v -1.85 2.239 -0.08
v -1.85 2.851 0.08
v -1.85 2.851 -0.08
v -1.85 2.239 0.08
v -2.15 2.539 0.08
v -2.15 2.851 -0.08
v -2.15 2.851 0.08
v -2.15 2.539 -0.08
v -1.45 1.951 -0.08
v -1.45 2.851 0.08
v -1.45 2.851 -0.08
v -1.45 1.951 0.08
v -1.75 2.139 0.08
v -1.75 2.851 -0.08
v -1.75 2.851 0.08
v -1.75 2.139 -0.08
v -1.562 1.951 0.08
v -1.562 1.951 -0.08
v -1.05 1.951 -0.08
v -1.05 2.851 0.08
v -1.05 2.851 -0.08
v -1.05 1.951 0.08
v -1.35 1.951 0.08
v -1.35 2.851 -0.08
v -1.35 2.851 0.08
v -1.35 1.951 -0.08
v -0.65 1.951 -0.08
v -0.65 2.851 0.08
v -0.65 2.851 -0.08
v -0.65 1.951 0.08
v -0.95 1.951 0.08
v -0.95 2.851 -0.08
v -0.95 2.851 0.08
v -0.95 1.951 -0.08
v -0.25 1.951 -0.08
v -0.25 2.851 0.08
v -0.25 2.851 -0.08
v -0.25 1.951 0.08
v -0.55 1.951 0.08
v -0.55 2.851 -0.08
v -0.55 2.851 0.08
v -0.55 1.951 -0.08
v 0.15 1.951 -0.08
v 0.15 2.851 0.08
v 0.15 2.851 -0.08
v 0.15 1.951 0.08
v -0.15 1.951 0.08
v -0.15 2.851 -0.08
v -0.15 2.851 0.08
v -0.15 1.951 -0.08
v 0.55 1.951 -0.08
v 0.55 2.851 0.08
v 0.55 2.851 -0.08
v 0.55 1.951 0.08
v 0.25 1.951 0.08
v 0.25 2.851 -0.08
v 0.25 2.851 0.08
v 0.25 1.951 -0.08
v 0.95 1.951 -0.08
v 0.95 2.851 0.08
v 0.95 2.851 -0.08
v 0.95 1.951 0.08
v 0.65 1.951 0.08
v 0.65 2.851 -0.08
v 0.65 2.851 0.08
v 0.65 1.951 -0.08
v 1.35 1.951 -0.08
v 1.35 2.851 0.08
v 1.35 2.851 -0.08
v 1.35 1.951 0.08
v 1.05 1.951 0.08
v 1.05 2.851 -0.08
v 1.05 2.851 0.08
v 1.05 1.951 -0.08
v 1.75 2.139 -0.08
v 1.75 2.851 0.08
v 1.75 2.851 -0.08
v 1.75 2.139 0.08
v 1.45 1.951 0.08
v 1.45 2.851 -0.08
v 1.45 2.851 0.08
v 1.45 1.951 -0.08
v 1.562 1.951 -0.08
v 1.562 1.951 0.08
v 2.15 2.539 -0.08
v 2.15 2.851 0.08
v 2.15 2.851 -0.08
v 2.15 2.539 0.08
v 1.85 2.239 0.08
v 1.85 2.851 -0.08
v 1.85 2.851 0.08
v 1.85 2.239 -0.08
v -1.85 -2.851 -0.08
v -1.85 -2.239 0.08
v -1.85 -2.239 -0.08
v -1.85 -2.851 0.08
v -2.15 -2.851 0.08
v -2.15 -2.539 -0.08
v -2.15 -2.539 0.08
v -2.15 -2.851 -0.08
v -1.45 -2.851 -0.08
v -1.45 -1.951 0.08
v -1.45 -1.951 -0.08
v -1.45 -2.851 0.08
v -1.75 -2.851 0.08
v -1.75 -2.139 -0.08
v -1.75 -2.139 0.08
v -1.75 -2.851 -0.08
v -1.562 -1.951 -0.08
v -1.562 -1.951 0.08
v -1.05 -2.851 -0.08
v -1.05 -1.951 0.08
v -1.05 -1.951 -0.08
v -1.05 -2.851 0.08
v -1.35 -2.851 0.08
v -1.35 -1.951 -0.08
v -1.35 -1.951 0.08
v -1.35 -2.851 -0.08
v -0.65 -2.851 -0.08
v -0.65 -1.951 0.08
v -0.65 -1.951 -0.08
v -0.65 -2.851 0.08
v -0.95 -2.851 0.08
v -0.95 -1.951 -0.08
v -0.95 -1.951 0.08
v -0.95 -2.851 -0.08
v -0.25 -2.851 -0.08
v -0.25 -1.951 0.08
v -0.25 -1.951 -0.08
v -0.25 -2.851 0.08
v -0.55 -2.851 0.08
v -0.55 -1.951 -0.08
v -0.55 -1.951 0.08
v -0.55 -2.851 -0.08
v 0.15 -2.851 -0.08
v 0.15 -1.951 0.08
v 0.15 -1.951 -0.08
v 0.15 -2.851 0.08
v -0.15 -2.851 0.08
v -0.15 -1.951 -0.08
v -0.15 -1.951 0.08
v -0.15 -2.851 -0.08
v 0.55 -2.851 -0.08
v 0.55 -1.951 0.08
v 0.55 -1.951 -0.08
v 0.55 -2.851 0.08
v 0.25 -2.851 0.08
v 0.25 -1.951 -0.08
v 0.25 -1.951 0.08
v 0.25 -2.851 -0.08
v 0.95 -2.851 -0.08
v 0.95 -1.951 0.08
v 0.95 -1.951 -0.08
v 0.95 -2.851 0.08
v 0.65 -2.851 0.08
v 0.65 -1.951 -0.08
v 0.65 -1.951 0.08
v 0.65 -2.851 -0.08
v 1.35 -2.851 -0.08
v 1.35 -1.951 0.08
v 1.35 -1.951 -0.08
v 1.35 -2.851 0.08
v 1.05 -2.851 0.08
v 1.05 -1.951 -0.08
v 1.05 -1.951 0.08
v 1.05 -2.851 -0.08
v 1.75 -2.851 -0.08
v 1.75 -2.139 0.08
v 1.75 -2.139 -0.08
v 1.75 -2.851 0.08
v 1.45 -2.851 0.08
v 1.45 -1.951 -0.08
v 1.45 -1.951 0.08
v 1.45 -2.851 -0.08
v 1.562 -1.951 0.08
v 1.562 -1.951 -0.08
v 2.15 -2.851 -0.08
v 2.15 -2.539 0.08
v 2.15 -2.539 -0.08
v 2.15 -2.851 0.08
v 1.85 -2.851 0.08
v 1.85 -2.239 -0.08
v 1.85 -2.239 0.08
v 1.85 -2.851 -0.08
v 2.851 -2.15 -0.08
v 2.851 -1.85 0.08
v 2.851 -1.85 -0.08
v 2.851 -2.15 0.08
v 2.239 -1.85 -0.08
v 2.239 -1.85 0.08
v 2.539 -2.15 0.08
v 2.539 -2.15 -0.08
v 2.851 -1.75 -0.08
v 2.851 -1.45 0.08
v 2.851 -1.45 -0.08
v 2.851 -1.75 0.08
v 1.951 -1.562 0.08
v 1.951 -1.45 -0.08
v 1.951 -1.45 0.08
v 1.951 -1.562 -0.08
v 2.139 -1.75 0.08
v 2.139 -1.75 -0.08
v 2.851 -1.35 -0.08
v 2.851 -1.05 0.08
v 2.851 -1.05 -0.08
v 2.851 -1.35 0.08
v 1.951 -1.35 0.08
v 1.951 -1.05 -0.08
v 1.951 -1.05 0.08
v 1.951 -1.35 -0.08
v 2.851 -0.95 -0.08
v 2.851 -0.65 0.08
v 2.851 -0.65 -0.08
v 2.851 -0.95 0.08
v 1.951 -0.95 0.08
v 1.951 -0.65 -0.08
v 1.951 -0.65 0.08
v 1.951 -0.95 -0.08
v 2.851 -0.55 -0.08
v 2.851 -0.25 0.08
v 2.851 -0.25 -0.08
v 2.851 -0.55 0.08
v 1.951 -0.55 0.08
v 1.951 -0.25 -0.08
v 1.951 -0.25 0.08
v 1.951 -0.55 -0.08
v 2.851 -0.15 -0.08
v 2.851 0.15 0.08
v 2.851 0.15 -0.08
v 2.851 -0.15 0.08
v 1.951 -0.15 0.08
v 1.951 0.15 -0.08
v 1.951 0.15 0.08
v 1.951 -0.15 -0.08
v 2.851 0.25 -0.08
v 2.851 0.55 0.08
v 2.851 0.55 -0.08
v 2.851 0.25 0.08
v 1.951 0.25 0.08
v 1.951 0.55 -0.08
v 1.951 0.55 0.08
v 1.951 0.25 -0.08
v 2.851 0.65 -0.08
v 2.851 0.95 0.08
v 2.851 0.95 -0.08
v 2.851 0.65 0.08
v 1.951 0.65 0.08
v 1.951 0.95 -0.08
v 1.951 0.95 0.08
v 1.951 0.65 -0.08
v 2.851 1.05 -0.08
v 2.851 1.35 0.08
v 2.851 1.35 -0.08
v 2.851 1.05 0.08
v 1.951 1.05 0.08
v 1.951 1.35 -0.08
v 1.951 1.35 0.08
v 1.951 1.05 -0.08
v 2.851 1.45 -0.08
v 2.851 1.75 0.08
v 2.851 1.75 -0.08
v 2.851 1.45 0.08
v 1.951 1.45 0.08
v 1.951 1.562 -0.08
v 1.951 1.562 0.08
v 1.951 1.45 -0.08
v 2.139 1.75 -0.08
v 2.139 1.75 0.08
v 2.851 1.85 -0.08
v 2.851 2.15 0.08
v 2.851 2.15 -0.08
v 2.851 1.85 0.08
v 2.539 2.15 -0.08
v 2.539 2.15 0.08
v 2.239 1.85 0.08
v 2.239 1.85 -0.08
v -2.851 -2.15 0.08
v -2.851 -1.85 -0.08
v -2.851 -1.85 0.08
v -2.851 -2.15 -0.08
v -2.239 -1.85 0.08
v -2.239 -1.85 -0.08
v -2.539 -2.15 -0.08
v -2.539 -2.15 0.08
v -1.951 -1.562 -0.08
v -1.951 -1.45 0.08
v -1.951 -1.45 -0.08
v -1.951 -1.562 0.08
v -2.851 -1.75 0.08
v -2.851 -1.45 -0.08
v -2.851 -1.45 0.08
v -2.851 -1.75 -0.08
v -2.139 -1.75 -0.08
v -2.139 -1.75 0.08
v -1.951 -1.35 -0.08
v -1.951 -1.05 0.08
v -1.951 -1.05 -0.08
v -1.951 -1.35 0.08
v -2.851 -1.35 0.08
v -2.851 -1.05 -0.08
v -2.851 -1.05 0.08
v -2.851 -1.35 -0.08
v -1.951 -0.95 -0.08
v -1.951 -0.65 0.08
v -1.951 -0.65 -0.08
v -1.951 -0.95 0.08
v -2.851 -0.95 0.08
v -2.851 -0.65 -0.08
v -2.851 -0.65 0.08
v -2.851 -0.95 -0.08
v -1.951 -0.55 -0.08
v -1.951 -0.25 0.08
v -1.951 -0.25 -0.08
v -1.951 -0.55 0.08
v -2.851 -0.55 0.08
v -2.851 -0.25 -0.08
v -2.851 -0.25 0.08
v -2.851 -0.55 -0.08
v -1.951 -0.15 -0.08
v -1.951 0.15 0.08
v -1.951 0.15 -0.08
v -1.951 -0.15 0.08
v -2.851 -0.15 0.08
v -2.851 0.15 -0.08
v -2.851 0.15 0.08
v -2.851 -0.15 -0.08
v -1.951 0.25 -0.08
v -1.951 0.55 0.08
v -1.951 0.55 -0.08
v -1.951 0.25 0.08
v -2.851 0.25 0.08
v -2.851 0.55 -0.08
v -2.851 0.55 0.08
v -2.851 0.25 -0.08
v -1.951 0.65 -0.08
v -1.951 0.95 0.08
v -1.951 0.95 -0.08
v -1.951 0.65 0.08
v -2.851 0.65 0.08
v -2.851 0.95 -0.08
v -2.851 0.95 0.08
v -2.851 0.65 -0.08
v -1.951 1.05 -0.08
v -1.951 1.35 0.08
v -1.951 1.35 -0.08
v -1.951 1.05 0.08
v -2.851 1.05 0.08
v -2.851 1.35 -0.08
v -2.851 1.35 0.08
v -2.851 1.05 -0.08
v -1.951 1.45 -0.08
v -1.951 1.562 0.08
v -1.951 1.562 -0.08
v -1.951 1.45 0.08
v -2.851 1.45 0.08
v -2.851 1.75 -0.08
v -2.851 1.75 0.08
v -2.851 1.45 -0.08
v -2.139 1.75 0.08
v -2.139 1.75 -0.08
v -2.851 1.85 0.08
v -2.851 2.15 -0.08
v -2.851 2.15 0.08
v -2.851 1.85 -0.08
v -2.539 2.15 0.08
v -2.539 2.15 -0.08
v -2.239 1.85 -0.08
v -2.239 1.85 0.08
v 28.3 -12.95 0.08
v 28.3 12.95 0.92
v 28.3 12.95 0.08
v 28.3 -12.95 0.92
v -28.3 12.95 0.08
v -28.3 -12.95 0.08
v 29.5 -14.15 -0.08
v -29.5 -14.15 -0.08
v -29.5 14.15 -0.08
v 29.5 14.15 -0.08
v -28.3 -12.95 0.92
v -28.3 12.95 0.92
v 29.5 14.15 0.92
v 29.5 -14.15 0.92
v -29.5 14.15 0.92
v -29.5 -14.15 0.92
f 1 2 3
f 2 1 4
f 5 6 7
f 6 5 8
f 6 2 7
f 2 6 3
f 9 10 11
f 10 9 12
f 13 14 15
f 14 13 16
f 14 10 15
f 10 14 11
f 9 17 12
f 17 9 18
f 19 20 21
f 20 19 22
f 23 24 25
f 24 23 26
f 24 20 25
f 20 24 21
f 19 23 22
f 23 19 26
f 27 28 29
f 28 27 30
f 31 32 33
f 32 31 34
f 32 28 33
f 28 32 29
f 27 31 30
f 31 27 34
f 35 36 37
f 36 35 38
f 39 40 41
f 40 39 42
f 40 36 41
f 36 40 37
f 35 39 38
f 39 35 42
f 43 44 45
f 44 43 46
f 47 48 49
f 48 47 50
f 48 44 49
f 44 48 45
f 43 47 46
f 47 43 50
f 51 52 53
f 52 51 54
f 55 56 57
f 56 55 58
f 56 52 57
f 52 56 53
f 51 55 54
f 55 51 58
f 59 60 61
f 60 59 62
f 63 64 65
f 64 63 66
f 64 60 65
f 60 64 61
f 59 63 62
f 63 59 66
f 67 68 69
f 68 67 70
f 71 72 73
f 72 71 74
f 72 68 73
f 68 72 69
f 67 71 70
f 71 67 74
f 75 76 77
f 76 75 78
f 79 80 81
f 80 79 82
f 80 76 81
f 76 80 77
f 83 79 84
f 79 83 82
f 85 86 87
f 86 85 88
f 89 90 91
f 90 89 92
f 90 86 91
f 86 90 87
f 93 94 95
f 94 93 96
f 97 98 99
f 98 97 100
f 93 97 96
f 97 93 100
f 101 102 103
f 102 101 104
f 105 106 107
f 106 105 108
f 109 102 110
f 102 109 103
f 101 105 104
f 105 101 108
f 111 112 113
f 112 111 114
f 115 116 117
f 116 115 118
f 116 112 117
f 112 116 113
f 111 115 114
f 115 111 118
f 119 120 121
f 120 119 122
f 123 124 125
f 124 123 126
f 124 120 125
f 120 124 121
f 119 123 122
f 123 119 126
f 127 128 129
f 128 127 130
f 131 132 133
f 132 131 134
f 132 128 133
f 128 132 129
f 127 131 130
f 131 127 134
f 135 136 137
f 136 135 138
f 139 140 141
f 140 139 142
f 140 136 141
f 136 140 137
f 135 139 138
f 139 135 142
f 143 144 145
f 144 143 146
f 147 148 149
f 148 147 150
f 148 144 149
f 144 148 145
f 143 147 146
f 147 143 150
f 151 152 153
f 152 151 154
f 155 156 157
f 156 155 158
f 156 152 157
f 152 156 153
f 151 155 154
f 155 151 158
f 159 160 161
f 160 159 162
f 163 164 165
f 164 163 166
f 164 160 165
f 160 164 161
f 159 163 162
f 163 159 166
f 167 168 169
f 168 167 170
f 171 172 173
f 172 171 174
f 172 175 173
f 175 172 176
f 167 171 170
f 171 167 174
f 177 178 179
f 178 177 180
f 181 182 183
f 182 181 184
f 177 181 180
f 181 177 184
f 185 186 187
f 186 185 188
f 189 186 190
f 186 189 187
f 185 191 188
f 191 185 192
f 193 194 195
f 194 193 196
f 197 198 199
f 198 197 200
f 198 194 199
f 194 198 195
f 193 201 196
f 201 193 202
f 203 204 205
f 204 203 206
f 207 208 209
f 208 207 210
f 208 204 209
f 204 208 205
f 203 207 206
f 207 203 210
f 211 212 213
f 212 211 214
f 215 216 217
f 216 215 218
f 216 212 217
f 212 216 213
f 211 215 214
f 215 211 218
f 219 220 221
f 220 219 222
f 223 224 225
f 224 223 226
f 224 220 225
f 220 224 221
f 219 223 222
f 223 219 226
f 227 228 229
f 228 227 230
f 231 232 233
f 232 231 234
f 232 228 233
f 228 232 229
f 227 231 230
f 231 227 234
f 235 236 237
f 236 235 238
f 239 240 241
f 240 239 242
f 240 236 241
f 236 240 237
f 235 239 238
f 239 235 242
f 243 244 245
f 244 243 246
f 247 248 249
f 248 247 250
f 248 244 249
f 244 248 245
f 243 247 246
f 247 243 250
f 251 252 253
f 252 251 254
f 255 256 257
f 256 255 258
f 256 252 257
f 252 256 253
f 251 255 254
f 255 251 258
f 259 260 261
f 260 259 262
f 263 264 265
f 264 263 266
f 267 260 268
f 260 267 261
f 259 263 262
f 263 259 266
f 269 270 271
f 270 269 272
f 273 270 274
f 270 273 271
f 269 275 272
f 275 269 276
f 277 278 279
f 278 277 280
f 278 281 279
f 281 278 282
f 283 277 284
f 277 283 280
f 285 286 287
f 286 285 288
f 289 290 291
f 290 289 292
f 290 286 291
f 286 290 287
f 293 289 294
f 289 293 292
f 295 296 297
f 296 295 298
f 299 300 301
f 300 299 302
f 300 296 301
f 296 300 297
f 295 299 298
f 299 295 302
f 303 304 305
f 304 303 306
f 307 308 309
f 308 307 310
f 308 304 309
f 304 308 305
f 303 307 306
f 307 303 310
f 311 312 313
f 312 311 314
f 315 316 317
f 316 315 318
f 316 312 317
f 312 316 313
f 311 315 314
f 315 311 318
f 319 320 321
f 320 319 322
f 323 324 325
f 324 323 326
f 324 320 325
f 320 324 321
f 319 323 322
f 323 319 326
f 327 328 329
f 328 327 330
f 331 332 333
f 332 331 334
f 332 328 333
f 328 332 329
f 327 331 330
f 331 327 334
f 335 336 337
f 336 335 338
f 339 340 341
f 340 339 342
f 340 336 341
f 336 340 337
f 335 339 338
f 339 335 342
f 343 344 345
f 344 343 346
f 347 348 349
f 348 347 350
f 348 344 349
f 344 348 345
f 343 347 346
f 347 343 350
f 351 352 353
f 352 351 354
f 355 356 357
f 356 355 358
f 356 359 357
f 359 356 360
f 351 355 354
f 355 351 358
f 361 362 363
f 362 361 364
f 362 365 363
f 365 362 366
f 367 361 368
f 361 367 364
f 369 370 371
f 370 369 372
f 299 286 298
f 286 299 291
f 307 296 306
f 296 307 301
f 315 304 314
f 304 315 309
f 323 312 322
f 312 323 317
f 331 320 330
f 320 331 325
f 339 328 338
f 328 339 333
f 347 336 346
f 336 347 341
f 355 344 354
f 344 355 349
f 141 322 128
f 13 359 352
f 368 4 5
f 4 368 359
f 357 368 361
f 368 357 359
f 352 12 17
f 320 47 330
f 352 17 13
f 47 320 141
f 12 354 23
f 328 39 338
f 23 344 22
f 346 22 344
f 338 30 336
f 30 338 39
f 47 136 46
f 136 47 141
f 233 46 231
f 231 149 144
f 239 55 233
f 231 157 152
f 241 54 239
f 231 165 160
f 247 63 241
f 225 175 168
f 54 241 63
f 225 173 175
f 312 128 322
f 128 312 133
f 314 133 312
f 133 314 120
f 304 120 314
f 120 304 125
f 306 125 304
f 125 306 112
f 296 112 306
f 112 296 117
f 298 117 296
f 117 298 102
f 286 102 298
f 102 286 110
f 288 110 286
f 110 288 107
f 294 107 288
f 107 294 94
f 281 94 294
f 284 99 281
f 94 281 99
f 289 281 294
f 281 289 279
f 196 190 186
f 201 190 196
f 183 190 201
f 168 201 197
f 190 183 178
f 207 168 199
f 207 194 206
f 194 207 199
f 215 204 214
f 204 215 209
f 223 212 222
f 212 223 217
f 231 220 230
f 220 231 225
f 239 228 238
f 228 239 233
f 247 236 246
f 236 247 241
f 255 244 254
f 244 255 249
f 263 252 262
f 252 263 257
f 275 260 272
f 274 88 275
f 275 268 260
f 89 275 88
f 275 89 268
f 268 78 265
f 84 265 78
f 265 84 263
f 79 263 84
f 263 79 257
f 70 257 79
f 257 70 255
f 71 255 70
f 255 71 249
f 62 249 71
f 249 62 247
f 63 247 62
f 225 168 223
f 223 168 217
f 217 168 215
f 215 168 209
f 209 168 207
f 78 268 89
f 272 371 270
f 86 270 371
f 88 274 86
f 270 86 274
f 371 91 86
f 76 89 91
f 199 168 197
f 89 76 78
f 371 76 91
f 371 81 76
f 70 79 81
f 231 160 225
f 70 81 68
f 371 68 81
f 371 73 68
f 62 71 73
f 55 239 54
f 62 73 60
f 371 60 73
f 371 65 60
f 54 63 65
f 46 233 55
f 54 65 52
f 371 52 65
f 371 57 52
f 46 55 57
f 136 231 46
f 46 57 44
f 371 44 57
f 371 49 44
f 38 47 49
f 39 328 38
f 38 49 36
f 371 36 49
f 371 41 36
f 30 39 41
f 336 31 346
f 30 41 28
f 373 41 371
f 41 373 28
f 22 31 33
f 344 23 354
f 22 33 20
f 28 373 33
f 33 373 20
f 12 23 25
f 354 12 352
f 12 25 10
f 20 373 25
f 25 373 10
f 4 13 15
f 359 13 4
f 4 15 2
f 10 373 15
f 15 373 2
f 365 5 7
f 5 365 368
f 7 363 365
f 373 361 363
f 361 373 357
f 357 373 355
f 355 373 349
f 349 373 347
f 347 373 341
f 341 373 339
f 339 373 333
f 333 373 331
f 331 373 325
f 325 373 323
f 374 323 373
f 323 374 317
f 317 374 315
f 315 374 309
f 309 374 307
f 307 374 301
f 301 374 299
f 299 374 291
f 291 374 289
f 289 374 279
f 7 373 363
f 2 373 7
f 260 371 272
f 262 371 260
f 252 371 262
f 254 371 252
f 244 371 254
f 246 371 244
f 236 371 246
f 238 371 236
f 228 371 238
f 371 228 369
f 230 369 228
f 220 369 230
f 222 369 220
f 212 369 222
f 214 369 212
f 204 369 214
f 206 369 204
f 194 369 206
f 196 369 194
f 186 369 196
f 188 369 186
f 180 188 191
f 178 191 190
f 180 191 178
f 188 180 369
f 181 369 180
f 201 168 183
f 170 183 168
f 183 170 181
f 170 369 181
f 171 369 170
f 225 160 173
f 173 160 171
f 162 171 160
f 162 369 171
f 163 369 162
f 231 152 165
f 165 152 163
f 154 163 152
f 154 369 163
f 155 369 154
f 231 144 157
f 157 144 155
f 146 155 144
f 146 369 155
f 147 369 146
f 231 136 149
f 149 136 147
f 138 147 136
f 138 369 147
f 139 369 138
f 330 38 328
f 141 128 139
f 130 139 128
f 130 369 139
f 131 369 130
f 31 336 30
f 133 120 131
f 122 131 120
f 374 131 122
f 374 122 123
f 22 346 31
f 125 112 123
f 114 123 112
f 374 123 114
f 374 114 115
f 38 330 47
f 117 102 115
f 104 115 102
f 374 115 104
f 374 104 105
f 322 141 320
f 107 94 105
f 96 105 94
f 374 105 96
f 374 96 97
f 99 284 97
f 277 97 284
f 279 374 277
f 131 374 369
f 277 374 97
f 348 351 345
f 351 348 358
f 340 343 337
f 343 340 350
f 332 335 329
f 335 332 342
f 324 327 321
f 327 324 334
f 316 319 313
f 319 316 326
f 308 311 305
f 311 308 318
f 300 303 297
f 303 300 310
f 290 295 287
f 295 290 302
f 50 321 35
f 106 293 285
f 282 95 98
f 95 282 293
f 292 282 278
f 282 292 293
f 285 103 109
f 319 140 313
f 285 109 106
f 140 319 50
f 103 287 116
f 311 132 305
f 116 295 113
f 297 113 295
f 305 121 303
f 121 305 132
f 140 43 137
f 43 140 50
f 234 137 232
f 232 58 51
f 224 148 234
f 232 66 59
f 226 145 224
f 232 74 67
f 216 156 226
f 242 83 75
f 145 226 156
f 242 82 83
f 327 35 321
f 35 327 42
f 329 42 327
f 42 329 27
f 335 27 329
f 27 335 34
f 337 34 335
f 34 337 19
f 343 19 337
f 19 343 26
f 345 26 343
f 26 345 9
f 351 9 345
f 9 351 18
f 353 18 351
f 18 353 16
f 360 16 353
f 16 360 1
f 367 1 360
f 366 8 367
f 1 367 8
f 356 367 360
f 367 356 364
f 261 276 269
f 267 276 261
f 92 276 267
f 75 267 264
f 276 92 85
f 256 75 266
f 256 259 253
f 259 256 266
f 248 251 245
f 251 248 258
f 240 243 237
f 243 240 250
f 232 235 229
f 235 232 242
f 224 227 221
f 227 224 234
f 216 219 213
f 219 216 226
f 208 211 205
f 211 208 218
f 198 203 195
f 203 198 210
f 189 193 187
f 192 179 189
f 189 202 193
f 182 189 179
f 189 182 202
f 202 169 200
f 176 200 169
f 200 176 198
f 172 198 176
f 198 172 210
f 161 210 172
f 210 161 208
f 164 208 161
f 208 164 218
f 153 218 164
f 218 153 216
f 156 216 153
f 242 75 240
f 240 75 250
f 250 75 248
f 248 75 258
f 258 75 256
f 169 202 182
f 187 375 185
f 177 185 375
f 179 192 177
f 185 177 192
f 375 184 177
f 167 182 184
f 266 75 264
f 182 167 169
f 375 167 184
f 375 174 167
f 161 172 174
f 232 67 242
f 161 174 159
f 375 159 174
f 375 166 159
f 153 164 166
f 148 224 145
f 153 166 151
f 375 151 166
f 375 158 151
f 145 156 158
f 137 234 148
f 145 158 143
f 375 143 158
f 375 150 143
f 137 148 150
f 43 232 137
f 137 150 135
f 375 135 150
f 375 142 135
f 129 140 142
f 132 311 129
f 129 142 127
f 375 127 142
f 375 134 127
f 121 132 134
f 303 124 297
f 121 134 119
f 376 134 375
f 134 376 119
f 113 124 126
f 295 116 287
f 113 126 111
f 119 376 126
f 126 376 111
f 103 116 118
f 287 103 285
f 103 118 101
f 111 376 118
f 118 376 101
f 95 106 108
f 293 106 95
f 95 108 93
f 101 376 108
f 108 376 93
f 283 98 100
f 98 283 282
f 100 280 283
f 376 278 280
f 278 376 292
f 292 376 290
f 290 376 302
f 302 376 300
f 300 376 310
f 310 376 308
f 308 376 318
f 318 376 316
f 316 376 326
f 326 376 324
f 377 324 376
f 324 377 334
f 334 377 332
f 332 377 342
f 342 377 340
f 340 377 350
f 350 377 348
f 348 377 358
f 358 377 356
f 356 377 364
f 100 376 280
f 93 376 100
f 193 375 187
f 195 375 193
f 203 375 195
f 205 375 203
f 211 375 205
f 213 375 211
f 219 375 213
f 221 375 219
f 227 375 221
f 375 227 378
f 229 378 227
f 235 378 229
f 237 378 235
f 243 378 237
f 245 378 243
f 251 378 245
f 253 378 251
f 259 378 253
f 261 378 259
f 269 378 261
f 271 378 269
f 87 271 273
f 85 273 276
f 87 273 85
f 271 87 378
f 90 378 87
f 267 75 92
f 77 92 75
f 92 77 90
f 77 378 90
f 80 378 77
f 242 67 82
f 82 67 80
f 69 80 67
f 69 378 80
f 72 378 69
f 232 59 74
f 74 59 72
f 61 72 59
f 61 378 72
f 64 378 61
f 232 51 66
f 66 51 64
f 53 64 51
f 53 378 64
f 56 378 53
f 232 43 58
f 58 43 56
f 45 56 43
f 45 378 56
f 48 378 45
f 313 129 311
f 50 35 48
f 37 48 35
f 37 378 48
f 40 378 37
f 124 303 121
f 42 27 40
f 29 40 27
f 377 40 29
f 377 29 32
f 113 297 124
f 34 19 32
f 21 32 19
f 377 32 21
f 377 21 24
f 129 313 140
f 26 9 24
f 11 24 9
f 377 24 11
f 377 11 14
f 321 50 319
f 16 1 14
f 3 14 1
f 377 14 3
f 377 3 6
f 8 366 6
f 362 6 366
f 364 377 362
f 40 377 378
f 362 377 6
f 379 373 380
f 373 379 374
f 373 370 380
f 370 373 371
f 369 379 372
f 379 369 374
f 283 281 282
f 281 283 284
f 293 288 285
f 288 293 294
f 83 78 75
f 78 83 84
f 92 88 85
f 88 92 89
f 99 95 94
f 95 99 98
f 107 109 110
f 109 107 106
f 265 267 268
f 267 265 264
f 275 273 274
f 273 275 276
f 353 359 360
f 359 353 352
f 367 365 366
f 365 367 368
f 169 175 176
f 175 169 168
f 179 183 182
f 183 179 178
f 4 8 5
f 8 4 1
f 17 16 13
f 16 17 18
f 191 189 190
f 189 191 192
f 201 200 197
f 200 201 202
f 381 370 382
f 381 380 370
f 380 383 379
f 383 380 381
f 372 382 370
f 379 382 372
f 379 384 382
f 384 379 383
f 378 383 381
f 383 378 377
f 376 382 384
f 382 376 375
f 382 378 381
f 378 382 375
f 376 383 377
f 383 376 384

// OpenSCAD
$fa = 0.1;
$fs = 0.1;
length = 56.6;
height = 25.9;
thickness = .16;
padwidth = .30;
padlength = .9;
lipheight = 1;
lipwidth = 1.2;
difference() {
cube([length,height,thickness],center=true);
translate([0,0,0]) {
rotate([0,0,0]) {
    //difference() {
        //cube([5.8, 5.8,thickness+.01],center=true);
        union() {
            for (i = [-2:.4:2]) {
                translate([i,2.401,0]) {
                    cube([padwidth,padlength,thickness+.02],center=true);
                }
            }
            for (i = [-2:.4:2]) {
                translate([i,-2.401,0]) {
                    cube([padwidth,padlength,thickness+.02],center=true);
                }
            }
            for (i = [-2:.4:2]) {
                translate([2.401,i,0]) {
                    cube([padlength,padwidth,thickness+.02],center=true);
                }
            }
            for (i = [-2:.4:2]) {
                translate([-2.401,i,0]) {
                    cube([padlength,padwidth,thickness+.02],center=true);
                }
            }
        }
        //}
        
    
}
}
}
rotate([0,0,45]) {
cube([8, .55, thickness], center=true);
}
rotate([0,0,45]) {
cube([.55, 8, thickness], center=true);
}
translate([-length/2,height/2,-thickness/2]) {
    cube([length, lipwidth, lipheight]);
}
translate([-length/2,-height/2 - lipwidth,-thickness/2]) {
    cube([length, lipwidth, lipheight]);
}
translate([length/2,-height/2 - lipwidth,-thickness/2]) {
    cube([lipwidth, height + 2 * lipwidth, lipheight]);
}
translate([- length/2 - lipwidth,-height/2 - lipwidth,-thickness/2]) {
    cube([lipwidth, height + 2 * lipwidth, lipheight]);
}
